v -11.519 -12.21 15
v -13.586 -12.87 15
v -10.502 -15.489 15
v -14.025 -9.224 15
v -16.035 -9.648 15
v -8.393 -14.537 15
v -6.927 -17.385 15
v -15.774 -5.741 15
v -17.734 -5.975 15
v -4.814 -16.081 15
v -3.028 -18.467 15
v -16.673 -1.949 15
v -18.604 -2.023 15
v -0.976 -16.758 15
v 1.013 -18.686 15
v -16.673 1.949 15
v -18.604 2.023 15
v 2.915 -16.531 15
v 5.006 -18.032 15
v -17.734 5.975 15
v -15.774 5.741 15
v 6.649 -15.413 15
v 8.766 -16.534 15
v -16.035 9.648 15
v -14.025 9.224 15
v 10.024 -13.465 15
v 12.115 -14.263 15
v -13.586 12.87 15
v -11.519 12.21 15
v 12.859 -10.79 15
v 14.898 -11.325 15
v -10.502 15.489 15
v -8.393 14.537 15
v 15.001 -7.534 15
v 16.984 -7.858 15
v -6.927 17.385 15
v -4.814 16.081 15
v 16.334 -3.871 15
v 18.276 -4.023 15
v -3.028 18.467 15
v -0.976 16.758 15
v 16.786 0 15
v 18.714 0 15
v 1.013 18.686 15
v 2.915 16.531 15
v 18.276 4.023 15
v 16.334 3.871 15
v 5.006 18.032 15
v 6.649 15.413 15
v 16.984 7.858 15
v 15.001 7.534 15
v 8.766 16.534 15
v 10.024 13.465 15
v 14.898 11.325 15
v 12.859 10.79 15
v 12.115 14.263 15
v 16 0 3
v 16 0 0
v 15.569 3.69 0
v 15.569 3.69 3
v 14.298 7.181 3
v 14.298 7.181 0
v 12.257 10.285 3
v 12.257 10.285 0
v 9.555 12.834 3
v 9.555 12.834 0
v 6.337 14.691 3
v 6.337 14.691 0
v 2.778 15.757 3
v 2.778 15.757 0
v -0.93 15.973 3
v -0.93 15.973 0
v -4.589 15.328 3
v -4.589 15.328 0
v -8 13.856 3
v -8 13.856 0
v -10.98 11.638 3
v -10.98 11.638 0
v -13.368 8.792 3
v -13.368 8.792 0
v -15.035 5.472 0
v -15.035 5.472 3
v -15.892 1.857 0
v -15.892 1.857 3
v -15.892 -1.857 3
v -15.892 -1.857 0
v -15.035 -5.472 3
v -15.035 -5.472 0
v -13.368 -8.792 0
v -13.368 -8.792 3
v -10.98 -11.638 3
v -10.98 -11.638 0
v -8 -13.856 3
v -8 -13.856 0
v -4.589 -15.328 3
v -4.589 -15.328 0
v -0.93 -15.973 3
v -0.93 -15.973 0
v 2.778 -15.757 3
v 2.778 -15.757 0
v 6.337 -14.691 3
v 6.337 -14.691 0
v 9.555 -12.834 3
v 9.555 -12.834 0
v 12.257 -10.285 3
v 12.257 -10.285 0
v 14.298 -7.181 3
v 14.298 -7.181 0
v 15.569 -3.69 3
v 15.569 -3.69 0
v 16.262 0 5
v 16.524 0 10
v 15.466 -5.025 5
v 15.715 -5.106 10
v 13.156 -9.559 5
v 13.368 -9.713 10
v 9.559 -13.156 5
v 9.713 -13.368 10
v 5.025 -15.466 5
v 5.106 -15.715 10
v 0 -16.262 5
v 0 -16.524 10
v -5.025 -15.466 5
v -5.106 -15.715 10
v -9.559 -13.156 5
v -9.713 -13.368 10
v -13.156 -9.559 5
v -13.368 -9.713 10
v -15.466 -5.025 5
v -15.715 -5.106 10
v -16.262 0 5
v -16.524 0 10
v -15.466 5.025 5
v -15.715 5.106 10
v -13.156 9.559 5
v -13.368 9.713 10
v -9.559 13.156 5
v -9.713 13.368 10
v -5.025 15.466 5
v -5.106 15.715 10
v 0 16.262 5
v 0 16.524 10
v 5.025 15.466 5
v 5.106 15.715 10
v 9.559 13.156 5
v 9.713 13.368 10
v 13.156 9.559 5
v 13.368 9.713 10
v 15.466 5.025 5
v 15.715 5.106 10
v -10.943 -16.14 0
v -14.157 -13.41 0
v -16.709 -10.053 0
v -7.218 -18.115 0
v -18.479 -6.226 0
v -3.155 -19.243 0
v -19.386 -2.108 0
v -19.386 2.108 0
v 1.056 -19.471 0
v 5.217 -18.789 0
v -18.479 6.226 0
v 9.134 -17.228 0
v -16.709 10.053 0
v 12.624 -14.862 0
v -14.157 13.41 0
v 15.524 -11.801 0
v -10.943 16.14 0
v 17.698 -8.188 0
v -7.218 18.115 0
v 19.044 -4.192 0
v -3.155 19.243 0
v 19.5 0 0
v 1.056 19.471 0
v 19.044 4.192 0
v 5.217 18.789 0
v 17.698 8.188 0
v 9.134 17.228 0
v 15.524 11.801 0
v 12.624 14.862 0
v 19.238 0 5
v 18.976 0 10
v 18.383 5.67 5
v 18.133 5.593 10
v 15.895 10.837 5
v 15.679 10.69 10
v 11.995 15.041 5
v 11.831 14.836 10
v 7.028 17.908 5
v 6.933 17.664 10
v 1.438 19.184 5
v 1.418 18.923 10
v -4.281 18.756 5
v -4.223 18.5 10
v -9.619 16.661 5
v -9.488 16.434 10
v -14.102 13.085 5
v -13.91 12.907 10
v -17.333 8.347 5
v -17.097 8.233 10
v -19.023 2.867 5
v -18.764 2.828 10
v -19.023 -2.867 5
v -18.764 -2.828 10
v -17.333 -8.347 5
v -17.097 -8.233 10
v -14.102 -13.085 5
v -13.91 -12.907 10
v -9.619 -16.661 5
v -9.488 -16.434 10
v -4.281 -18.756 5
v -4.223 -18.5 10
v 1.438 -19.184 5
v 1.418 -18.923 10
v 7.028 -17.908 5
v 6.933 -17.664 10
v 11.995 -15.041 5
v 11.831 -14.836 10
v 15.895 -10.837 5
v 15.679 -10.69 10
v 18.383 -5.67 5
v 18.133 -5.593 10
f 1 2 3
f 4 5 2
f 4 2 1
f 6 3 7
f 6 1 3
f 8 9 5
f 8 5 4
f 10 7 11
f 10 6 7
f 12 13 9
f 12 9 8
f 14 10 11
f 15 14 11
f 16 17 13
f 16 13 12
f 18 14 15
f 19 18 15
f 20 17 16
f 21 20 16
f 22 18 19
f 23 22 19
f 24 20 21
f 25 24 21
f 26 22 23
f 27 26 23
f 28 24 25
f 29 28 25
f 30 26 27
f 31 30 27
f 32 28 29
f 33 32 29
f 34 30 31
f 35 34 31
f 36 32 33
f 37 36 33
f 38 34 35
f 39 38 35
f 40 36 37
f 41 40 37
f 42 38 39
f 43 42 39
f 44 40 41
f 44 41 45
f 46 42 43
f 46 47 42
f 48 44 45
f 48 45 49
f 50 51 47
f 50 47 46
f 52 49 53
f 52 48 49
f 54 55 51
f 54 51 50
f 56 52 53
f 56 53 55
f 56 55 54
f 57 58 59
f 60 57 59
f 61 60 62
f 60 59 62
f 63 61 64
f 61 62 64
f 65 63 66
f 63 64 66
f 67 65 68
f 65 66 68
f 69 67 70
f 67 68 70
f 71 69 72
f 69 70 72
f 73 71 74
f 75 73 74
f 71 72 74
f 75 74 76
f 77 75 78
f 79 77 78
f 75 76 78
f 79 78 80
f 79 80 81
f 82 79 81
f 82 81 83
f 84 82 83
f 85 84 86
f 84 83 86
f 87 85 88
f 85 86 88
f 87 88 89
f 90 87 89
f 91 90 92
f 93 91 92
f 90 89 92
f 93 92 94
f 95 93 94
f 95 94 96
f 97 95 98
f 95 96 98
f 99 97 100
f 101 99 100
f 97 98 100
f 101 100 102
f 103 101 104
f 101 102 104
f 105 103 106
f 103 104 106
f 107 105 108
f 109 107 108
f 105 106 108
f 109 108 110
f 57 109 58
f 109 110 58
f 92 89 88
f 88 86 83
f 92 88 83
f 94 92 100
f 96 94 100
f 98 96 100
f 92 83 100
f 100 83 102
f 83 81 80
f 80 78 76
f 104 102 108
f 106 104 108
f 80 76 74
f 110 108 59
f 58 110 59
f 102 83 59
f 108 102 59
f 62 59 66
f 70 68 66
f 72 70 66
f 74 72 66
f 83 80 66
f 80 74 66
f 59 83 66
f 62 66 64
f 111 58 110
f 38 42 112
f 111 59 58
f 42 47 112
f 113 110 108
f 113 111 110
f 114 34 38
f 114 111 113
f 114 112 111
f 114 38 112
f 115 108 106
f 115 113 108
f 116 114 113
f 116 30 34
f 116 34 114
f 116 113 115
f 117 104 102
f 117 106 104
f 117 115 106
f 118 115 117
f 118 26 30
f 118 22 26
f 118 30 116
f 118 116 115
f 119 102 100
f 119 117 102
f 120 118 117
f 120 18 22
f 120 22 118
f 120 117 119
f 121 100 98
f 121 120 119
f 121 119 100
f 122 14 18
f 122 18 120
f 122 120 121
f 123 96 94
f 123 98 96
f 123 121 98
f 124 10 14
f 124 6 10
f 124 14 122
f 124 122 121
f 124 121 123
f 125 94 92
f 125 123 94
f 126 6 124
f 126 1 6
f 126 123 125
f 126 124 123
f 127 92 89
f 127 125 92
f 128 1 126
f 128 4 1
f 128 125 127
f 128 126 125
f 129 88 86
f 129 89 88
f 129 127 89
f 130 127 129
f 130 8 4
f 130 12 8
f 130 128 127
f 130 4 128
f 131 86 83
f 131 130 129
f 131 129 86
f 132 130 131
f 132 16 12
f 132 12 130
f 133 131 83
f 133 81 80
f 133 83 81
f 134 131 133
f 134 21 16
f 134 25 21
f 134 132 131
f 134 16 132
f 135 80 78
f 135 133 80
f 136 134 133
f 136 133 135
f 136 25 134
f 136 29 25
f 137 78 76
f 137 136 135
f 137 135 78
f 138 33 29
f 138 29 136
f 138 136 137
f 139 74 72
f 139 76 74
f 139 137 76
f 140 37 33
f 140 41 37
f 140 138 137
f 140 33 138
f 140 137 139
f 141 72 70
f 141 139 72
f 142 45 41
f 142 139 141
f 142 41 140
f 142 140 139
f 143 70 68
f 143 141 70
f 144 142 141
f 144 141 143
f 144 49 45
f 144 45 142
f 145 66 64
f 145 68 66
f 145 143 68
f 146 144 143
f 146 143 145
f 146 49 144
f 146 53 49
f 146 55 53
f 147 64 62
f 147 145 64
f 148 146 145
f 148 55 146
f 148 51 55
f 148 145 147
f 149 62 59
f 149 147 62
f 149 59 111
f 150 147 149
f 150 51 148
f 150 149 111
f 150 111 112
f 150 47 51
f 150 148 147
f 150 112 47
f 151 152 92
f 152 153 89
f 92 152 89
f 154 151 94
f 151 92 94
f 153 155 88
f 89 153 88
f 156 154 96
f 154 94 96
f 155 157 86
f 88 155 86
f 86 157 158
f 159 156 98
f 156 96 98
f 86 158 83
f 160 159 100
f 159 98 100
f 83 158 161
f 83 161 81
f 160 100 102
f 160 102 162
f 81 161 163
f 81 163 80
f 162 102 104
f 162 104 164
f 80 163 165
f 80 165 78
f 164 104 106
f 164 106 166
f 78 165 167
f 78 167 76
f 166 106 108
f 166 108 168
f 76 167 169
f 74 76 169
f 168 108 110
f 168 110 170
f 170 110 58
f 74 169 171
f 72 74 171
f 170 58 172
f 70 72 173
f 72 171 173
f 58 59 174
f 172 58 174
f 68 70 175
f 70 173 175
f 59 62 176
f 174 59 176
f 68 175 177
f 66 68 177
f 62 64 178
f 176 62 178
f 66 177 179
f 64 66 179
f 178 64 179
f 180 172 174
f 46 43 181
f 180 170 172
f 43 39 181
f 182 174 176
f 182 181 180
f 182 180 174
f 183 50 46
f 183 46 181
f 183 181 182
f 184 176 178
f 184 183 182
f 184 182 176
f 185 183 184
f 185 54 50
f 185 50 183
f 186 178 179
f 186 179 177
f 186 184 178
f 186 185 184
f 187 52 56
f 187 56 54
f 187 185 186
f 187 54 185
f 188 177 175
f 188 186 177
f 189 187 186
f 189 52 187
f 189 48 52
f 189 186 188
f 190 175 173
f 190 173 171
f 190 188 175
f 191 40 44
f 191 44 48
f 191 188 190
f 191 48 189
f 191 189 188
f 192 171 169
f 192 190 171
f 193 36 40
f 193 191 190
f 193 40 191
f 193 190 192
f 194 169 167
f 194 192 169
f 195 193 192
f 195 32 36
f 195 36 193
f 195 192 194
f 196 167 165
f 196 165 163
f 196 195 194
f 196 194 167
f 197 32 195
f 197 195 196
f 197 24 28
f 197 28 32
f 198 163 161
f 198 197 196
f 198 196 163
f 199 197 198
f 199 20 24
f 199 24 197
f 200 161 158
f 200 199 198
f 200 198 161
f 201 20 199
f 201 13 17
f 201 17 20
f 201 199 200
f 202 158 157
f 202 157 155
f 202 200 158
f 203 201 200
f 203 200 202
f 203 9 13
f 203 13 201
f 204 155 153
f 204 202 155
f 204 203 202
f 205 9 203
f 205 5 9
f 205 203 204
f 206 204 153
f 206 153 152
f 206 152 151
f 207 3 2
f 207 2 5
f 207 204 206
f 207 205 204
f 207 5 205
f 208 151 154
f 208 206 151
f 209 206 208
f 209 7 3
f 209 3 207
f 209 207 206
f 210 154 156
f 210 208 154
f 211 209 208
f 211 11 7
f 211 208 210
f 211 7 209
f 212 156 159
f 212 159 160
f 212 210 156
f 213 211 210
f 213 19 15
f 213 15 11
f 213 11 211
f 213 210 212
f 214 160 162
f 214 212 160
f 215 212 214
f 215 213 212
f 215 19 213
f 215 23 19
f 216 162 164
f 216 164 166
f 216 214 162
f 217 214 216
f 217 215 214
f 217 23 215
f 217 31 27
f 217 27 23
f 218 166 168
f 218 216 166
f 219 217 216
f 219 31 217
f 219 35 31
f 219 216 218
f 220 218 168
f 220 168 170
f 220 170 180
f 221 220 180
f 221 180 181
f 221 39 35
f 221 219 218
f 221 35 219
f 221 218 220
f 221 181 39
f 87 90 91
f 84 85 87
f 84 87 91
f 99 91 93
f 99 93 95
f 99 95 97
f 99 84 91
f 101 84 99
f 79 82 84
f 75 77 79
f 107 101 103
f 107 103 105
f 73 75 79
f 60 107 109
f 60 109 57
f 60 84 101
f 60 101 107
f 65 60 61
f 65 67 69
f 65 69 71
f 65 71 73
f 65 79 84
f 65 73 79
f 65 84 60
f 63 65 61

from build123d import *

# Parameters (mm, degrees)
F0_R     = 19.5
F0_R_2   = 16
F1_DEPTH = 15
F1_TAPER = 3
F2_DEPTH = 3


with BuildPart() as f1:
    # F0 (on Top) → F1 (new body)
    with BuildSketch(Plane.XY):
        Circle(F0_R)
        Circle(F0_R_2, mode=Mode.SUBTRACT)
    extrude(amount=F1_DEPTH, taper=F1_TAPER)

    # F0 (on Top) → F2 (join)
    with BuildSketch(Plane.XY):
        Circle(F0_R_2)
    extrude(amount=F2_DEPTH)


solid = f1.part
